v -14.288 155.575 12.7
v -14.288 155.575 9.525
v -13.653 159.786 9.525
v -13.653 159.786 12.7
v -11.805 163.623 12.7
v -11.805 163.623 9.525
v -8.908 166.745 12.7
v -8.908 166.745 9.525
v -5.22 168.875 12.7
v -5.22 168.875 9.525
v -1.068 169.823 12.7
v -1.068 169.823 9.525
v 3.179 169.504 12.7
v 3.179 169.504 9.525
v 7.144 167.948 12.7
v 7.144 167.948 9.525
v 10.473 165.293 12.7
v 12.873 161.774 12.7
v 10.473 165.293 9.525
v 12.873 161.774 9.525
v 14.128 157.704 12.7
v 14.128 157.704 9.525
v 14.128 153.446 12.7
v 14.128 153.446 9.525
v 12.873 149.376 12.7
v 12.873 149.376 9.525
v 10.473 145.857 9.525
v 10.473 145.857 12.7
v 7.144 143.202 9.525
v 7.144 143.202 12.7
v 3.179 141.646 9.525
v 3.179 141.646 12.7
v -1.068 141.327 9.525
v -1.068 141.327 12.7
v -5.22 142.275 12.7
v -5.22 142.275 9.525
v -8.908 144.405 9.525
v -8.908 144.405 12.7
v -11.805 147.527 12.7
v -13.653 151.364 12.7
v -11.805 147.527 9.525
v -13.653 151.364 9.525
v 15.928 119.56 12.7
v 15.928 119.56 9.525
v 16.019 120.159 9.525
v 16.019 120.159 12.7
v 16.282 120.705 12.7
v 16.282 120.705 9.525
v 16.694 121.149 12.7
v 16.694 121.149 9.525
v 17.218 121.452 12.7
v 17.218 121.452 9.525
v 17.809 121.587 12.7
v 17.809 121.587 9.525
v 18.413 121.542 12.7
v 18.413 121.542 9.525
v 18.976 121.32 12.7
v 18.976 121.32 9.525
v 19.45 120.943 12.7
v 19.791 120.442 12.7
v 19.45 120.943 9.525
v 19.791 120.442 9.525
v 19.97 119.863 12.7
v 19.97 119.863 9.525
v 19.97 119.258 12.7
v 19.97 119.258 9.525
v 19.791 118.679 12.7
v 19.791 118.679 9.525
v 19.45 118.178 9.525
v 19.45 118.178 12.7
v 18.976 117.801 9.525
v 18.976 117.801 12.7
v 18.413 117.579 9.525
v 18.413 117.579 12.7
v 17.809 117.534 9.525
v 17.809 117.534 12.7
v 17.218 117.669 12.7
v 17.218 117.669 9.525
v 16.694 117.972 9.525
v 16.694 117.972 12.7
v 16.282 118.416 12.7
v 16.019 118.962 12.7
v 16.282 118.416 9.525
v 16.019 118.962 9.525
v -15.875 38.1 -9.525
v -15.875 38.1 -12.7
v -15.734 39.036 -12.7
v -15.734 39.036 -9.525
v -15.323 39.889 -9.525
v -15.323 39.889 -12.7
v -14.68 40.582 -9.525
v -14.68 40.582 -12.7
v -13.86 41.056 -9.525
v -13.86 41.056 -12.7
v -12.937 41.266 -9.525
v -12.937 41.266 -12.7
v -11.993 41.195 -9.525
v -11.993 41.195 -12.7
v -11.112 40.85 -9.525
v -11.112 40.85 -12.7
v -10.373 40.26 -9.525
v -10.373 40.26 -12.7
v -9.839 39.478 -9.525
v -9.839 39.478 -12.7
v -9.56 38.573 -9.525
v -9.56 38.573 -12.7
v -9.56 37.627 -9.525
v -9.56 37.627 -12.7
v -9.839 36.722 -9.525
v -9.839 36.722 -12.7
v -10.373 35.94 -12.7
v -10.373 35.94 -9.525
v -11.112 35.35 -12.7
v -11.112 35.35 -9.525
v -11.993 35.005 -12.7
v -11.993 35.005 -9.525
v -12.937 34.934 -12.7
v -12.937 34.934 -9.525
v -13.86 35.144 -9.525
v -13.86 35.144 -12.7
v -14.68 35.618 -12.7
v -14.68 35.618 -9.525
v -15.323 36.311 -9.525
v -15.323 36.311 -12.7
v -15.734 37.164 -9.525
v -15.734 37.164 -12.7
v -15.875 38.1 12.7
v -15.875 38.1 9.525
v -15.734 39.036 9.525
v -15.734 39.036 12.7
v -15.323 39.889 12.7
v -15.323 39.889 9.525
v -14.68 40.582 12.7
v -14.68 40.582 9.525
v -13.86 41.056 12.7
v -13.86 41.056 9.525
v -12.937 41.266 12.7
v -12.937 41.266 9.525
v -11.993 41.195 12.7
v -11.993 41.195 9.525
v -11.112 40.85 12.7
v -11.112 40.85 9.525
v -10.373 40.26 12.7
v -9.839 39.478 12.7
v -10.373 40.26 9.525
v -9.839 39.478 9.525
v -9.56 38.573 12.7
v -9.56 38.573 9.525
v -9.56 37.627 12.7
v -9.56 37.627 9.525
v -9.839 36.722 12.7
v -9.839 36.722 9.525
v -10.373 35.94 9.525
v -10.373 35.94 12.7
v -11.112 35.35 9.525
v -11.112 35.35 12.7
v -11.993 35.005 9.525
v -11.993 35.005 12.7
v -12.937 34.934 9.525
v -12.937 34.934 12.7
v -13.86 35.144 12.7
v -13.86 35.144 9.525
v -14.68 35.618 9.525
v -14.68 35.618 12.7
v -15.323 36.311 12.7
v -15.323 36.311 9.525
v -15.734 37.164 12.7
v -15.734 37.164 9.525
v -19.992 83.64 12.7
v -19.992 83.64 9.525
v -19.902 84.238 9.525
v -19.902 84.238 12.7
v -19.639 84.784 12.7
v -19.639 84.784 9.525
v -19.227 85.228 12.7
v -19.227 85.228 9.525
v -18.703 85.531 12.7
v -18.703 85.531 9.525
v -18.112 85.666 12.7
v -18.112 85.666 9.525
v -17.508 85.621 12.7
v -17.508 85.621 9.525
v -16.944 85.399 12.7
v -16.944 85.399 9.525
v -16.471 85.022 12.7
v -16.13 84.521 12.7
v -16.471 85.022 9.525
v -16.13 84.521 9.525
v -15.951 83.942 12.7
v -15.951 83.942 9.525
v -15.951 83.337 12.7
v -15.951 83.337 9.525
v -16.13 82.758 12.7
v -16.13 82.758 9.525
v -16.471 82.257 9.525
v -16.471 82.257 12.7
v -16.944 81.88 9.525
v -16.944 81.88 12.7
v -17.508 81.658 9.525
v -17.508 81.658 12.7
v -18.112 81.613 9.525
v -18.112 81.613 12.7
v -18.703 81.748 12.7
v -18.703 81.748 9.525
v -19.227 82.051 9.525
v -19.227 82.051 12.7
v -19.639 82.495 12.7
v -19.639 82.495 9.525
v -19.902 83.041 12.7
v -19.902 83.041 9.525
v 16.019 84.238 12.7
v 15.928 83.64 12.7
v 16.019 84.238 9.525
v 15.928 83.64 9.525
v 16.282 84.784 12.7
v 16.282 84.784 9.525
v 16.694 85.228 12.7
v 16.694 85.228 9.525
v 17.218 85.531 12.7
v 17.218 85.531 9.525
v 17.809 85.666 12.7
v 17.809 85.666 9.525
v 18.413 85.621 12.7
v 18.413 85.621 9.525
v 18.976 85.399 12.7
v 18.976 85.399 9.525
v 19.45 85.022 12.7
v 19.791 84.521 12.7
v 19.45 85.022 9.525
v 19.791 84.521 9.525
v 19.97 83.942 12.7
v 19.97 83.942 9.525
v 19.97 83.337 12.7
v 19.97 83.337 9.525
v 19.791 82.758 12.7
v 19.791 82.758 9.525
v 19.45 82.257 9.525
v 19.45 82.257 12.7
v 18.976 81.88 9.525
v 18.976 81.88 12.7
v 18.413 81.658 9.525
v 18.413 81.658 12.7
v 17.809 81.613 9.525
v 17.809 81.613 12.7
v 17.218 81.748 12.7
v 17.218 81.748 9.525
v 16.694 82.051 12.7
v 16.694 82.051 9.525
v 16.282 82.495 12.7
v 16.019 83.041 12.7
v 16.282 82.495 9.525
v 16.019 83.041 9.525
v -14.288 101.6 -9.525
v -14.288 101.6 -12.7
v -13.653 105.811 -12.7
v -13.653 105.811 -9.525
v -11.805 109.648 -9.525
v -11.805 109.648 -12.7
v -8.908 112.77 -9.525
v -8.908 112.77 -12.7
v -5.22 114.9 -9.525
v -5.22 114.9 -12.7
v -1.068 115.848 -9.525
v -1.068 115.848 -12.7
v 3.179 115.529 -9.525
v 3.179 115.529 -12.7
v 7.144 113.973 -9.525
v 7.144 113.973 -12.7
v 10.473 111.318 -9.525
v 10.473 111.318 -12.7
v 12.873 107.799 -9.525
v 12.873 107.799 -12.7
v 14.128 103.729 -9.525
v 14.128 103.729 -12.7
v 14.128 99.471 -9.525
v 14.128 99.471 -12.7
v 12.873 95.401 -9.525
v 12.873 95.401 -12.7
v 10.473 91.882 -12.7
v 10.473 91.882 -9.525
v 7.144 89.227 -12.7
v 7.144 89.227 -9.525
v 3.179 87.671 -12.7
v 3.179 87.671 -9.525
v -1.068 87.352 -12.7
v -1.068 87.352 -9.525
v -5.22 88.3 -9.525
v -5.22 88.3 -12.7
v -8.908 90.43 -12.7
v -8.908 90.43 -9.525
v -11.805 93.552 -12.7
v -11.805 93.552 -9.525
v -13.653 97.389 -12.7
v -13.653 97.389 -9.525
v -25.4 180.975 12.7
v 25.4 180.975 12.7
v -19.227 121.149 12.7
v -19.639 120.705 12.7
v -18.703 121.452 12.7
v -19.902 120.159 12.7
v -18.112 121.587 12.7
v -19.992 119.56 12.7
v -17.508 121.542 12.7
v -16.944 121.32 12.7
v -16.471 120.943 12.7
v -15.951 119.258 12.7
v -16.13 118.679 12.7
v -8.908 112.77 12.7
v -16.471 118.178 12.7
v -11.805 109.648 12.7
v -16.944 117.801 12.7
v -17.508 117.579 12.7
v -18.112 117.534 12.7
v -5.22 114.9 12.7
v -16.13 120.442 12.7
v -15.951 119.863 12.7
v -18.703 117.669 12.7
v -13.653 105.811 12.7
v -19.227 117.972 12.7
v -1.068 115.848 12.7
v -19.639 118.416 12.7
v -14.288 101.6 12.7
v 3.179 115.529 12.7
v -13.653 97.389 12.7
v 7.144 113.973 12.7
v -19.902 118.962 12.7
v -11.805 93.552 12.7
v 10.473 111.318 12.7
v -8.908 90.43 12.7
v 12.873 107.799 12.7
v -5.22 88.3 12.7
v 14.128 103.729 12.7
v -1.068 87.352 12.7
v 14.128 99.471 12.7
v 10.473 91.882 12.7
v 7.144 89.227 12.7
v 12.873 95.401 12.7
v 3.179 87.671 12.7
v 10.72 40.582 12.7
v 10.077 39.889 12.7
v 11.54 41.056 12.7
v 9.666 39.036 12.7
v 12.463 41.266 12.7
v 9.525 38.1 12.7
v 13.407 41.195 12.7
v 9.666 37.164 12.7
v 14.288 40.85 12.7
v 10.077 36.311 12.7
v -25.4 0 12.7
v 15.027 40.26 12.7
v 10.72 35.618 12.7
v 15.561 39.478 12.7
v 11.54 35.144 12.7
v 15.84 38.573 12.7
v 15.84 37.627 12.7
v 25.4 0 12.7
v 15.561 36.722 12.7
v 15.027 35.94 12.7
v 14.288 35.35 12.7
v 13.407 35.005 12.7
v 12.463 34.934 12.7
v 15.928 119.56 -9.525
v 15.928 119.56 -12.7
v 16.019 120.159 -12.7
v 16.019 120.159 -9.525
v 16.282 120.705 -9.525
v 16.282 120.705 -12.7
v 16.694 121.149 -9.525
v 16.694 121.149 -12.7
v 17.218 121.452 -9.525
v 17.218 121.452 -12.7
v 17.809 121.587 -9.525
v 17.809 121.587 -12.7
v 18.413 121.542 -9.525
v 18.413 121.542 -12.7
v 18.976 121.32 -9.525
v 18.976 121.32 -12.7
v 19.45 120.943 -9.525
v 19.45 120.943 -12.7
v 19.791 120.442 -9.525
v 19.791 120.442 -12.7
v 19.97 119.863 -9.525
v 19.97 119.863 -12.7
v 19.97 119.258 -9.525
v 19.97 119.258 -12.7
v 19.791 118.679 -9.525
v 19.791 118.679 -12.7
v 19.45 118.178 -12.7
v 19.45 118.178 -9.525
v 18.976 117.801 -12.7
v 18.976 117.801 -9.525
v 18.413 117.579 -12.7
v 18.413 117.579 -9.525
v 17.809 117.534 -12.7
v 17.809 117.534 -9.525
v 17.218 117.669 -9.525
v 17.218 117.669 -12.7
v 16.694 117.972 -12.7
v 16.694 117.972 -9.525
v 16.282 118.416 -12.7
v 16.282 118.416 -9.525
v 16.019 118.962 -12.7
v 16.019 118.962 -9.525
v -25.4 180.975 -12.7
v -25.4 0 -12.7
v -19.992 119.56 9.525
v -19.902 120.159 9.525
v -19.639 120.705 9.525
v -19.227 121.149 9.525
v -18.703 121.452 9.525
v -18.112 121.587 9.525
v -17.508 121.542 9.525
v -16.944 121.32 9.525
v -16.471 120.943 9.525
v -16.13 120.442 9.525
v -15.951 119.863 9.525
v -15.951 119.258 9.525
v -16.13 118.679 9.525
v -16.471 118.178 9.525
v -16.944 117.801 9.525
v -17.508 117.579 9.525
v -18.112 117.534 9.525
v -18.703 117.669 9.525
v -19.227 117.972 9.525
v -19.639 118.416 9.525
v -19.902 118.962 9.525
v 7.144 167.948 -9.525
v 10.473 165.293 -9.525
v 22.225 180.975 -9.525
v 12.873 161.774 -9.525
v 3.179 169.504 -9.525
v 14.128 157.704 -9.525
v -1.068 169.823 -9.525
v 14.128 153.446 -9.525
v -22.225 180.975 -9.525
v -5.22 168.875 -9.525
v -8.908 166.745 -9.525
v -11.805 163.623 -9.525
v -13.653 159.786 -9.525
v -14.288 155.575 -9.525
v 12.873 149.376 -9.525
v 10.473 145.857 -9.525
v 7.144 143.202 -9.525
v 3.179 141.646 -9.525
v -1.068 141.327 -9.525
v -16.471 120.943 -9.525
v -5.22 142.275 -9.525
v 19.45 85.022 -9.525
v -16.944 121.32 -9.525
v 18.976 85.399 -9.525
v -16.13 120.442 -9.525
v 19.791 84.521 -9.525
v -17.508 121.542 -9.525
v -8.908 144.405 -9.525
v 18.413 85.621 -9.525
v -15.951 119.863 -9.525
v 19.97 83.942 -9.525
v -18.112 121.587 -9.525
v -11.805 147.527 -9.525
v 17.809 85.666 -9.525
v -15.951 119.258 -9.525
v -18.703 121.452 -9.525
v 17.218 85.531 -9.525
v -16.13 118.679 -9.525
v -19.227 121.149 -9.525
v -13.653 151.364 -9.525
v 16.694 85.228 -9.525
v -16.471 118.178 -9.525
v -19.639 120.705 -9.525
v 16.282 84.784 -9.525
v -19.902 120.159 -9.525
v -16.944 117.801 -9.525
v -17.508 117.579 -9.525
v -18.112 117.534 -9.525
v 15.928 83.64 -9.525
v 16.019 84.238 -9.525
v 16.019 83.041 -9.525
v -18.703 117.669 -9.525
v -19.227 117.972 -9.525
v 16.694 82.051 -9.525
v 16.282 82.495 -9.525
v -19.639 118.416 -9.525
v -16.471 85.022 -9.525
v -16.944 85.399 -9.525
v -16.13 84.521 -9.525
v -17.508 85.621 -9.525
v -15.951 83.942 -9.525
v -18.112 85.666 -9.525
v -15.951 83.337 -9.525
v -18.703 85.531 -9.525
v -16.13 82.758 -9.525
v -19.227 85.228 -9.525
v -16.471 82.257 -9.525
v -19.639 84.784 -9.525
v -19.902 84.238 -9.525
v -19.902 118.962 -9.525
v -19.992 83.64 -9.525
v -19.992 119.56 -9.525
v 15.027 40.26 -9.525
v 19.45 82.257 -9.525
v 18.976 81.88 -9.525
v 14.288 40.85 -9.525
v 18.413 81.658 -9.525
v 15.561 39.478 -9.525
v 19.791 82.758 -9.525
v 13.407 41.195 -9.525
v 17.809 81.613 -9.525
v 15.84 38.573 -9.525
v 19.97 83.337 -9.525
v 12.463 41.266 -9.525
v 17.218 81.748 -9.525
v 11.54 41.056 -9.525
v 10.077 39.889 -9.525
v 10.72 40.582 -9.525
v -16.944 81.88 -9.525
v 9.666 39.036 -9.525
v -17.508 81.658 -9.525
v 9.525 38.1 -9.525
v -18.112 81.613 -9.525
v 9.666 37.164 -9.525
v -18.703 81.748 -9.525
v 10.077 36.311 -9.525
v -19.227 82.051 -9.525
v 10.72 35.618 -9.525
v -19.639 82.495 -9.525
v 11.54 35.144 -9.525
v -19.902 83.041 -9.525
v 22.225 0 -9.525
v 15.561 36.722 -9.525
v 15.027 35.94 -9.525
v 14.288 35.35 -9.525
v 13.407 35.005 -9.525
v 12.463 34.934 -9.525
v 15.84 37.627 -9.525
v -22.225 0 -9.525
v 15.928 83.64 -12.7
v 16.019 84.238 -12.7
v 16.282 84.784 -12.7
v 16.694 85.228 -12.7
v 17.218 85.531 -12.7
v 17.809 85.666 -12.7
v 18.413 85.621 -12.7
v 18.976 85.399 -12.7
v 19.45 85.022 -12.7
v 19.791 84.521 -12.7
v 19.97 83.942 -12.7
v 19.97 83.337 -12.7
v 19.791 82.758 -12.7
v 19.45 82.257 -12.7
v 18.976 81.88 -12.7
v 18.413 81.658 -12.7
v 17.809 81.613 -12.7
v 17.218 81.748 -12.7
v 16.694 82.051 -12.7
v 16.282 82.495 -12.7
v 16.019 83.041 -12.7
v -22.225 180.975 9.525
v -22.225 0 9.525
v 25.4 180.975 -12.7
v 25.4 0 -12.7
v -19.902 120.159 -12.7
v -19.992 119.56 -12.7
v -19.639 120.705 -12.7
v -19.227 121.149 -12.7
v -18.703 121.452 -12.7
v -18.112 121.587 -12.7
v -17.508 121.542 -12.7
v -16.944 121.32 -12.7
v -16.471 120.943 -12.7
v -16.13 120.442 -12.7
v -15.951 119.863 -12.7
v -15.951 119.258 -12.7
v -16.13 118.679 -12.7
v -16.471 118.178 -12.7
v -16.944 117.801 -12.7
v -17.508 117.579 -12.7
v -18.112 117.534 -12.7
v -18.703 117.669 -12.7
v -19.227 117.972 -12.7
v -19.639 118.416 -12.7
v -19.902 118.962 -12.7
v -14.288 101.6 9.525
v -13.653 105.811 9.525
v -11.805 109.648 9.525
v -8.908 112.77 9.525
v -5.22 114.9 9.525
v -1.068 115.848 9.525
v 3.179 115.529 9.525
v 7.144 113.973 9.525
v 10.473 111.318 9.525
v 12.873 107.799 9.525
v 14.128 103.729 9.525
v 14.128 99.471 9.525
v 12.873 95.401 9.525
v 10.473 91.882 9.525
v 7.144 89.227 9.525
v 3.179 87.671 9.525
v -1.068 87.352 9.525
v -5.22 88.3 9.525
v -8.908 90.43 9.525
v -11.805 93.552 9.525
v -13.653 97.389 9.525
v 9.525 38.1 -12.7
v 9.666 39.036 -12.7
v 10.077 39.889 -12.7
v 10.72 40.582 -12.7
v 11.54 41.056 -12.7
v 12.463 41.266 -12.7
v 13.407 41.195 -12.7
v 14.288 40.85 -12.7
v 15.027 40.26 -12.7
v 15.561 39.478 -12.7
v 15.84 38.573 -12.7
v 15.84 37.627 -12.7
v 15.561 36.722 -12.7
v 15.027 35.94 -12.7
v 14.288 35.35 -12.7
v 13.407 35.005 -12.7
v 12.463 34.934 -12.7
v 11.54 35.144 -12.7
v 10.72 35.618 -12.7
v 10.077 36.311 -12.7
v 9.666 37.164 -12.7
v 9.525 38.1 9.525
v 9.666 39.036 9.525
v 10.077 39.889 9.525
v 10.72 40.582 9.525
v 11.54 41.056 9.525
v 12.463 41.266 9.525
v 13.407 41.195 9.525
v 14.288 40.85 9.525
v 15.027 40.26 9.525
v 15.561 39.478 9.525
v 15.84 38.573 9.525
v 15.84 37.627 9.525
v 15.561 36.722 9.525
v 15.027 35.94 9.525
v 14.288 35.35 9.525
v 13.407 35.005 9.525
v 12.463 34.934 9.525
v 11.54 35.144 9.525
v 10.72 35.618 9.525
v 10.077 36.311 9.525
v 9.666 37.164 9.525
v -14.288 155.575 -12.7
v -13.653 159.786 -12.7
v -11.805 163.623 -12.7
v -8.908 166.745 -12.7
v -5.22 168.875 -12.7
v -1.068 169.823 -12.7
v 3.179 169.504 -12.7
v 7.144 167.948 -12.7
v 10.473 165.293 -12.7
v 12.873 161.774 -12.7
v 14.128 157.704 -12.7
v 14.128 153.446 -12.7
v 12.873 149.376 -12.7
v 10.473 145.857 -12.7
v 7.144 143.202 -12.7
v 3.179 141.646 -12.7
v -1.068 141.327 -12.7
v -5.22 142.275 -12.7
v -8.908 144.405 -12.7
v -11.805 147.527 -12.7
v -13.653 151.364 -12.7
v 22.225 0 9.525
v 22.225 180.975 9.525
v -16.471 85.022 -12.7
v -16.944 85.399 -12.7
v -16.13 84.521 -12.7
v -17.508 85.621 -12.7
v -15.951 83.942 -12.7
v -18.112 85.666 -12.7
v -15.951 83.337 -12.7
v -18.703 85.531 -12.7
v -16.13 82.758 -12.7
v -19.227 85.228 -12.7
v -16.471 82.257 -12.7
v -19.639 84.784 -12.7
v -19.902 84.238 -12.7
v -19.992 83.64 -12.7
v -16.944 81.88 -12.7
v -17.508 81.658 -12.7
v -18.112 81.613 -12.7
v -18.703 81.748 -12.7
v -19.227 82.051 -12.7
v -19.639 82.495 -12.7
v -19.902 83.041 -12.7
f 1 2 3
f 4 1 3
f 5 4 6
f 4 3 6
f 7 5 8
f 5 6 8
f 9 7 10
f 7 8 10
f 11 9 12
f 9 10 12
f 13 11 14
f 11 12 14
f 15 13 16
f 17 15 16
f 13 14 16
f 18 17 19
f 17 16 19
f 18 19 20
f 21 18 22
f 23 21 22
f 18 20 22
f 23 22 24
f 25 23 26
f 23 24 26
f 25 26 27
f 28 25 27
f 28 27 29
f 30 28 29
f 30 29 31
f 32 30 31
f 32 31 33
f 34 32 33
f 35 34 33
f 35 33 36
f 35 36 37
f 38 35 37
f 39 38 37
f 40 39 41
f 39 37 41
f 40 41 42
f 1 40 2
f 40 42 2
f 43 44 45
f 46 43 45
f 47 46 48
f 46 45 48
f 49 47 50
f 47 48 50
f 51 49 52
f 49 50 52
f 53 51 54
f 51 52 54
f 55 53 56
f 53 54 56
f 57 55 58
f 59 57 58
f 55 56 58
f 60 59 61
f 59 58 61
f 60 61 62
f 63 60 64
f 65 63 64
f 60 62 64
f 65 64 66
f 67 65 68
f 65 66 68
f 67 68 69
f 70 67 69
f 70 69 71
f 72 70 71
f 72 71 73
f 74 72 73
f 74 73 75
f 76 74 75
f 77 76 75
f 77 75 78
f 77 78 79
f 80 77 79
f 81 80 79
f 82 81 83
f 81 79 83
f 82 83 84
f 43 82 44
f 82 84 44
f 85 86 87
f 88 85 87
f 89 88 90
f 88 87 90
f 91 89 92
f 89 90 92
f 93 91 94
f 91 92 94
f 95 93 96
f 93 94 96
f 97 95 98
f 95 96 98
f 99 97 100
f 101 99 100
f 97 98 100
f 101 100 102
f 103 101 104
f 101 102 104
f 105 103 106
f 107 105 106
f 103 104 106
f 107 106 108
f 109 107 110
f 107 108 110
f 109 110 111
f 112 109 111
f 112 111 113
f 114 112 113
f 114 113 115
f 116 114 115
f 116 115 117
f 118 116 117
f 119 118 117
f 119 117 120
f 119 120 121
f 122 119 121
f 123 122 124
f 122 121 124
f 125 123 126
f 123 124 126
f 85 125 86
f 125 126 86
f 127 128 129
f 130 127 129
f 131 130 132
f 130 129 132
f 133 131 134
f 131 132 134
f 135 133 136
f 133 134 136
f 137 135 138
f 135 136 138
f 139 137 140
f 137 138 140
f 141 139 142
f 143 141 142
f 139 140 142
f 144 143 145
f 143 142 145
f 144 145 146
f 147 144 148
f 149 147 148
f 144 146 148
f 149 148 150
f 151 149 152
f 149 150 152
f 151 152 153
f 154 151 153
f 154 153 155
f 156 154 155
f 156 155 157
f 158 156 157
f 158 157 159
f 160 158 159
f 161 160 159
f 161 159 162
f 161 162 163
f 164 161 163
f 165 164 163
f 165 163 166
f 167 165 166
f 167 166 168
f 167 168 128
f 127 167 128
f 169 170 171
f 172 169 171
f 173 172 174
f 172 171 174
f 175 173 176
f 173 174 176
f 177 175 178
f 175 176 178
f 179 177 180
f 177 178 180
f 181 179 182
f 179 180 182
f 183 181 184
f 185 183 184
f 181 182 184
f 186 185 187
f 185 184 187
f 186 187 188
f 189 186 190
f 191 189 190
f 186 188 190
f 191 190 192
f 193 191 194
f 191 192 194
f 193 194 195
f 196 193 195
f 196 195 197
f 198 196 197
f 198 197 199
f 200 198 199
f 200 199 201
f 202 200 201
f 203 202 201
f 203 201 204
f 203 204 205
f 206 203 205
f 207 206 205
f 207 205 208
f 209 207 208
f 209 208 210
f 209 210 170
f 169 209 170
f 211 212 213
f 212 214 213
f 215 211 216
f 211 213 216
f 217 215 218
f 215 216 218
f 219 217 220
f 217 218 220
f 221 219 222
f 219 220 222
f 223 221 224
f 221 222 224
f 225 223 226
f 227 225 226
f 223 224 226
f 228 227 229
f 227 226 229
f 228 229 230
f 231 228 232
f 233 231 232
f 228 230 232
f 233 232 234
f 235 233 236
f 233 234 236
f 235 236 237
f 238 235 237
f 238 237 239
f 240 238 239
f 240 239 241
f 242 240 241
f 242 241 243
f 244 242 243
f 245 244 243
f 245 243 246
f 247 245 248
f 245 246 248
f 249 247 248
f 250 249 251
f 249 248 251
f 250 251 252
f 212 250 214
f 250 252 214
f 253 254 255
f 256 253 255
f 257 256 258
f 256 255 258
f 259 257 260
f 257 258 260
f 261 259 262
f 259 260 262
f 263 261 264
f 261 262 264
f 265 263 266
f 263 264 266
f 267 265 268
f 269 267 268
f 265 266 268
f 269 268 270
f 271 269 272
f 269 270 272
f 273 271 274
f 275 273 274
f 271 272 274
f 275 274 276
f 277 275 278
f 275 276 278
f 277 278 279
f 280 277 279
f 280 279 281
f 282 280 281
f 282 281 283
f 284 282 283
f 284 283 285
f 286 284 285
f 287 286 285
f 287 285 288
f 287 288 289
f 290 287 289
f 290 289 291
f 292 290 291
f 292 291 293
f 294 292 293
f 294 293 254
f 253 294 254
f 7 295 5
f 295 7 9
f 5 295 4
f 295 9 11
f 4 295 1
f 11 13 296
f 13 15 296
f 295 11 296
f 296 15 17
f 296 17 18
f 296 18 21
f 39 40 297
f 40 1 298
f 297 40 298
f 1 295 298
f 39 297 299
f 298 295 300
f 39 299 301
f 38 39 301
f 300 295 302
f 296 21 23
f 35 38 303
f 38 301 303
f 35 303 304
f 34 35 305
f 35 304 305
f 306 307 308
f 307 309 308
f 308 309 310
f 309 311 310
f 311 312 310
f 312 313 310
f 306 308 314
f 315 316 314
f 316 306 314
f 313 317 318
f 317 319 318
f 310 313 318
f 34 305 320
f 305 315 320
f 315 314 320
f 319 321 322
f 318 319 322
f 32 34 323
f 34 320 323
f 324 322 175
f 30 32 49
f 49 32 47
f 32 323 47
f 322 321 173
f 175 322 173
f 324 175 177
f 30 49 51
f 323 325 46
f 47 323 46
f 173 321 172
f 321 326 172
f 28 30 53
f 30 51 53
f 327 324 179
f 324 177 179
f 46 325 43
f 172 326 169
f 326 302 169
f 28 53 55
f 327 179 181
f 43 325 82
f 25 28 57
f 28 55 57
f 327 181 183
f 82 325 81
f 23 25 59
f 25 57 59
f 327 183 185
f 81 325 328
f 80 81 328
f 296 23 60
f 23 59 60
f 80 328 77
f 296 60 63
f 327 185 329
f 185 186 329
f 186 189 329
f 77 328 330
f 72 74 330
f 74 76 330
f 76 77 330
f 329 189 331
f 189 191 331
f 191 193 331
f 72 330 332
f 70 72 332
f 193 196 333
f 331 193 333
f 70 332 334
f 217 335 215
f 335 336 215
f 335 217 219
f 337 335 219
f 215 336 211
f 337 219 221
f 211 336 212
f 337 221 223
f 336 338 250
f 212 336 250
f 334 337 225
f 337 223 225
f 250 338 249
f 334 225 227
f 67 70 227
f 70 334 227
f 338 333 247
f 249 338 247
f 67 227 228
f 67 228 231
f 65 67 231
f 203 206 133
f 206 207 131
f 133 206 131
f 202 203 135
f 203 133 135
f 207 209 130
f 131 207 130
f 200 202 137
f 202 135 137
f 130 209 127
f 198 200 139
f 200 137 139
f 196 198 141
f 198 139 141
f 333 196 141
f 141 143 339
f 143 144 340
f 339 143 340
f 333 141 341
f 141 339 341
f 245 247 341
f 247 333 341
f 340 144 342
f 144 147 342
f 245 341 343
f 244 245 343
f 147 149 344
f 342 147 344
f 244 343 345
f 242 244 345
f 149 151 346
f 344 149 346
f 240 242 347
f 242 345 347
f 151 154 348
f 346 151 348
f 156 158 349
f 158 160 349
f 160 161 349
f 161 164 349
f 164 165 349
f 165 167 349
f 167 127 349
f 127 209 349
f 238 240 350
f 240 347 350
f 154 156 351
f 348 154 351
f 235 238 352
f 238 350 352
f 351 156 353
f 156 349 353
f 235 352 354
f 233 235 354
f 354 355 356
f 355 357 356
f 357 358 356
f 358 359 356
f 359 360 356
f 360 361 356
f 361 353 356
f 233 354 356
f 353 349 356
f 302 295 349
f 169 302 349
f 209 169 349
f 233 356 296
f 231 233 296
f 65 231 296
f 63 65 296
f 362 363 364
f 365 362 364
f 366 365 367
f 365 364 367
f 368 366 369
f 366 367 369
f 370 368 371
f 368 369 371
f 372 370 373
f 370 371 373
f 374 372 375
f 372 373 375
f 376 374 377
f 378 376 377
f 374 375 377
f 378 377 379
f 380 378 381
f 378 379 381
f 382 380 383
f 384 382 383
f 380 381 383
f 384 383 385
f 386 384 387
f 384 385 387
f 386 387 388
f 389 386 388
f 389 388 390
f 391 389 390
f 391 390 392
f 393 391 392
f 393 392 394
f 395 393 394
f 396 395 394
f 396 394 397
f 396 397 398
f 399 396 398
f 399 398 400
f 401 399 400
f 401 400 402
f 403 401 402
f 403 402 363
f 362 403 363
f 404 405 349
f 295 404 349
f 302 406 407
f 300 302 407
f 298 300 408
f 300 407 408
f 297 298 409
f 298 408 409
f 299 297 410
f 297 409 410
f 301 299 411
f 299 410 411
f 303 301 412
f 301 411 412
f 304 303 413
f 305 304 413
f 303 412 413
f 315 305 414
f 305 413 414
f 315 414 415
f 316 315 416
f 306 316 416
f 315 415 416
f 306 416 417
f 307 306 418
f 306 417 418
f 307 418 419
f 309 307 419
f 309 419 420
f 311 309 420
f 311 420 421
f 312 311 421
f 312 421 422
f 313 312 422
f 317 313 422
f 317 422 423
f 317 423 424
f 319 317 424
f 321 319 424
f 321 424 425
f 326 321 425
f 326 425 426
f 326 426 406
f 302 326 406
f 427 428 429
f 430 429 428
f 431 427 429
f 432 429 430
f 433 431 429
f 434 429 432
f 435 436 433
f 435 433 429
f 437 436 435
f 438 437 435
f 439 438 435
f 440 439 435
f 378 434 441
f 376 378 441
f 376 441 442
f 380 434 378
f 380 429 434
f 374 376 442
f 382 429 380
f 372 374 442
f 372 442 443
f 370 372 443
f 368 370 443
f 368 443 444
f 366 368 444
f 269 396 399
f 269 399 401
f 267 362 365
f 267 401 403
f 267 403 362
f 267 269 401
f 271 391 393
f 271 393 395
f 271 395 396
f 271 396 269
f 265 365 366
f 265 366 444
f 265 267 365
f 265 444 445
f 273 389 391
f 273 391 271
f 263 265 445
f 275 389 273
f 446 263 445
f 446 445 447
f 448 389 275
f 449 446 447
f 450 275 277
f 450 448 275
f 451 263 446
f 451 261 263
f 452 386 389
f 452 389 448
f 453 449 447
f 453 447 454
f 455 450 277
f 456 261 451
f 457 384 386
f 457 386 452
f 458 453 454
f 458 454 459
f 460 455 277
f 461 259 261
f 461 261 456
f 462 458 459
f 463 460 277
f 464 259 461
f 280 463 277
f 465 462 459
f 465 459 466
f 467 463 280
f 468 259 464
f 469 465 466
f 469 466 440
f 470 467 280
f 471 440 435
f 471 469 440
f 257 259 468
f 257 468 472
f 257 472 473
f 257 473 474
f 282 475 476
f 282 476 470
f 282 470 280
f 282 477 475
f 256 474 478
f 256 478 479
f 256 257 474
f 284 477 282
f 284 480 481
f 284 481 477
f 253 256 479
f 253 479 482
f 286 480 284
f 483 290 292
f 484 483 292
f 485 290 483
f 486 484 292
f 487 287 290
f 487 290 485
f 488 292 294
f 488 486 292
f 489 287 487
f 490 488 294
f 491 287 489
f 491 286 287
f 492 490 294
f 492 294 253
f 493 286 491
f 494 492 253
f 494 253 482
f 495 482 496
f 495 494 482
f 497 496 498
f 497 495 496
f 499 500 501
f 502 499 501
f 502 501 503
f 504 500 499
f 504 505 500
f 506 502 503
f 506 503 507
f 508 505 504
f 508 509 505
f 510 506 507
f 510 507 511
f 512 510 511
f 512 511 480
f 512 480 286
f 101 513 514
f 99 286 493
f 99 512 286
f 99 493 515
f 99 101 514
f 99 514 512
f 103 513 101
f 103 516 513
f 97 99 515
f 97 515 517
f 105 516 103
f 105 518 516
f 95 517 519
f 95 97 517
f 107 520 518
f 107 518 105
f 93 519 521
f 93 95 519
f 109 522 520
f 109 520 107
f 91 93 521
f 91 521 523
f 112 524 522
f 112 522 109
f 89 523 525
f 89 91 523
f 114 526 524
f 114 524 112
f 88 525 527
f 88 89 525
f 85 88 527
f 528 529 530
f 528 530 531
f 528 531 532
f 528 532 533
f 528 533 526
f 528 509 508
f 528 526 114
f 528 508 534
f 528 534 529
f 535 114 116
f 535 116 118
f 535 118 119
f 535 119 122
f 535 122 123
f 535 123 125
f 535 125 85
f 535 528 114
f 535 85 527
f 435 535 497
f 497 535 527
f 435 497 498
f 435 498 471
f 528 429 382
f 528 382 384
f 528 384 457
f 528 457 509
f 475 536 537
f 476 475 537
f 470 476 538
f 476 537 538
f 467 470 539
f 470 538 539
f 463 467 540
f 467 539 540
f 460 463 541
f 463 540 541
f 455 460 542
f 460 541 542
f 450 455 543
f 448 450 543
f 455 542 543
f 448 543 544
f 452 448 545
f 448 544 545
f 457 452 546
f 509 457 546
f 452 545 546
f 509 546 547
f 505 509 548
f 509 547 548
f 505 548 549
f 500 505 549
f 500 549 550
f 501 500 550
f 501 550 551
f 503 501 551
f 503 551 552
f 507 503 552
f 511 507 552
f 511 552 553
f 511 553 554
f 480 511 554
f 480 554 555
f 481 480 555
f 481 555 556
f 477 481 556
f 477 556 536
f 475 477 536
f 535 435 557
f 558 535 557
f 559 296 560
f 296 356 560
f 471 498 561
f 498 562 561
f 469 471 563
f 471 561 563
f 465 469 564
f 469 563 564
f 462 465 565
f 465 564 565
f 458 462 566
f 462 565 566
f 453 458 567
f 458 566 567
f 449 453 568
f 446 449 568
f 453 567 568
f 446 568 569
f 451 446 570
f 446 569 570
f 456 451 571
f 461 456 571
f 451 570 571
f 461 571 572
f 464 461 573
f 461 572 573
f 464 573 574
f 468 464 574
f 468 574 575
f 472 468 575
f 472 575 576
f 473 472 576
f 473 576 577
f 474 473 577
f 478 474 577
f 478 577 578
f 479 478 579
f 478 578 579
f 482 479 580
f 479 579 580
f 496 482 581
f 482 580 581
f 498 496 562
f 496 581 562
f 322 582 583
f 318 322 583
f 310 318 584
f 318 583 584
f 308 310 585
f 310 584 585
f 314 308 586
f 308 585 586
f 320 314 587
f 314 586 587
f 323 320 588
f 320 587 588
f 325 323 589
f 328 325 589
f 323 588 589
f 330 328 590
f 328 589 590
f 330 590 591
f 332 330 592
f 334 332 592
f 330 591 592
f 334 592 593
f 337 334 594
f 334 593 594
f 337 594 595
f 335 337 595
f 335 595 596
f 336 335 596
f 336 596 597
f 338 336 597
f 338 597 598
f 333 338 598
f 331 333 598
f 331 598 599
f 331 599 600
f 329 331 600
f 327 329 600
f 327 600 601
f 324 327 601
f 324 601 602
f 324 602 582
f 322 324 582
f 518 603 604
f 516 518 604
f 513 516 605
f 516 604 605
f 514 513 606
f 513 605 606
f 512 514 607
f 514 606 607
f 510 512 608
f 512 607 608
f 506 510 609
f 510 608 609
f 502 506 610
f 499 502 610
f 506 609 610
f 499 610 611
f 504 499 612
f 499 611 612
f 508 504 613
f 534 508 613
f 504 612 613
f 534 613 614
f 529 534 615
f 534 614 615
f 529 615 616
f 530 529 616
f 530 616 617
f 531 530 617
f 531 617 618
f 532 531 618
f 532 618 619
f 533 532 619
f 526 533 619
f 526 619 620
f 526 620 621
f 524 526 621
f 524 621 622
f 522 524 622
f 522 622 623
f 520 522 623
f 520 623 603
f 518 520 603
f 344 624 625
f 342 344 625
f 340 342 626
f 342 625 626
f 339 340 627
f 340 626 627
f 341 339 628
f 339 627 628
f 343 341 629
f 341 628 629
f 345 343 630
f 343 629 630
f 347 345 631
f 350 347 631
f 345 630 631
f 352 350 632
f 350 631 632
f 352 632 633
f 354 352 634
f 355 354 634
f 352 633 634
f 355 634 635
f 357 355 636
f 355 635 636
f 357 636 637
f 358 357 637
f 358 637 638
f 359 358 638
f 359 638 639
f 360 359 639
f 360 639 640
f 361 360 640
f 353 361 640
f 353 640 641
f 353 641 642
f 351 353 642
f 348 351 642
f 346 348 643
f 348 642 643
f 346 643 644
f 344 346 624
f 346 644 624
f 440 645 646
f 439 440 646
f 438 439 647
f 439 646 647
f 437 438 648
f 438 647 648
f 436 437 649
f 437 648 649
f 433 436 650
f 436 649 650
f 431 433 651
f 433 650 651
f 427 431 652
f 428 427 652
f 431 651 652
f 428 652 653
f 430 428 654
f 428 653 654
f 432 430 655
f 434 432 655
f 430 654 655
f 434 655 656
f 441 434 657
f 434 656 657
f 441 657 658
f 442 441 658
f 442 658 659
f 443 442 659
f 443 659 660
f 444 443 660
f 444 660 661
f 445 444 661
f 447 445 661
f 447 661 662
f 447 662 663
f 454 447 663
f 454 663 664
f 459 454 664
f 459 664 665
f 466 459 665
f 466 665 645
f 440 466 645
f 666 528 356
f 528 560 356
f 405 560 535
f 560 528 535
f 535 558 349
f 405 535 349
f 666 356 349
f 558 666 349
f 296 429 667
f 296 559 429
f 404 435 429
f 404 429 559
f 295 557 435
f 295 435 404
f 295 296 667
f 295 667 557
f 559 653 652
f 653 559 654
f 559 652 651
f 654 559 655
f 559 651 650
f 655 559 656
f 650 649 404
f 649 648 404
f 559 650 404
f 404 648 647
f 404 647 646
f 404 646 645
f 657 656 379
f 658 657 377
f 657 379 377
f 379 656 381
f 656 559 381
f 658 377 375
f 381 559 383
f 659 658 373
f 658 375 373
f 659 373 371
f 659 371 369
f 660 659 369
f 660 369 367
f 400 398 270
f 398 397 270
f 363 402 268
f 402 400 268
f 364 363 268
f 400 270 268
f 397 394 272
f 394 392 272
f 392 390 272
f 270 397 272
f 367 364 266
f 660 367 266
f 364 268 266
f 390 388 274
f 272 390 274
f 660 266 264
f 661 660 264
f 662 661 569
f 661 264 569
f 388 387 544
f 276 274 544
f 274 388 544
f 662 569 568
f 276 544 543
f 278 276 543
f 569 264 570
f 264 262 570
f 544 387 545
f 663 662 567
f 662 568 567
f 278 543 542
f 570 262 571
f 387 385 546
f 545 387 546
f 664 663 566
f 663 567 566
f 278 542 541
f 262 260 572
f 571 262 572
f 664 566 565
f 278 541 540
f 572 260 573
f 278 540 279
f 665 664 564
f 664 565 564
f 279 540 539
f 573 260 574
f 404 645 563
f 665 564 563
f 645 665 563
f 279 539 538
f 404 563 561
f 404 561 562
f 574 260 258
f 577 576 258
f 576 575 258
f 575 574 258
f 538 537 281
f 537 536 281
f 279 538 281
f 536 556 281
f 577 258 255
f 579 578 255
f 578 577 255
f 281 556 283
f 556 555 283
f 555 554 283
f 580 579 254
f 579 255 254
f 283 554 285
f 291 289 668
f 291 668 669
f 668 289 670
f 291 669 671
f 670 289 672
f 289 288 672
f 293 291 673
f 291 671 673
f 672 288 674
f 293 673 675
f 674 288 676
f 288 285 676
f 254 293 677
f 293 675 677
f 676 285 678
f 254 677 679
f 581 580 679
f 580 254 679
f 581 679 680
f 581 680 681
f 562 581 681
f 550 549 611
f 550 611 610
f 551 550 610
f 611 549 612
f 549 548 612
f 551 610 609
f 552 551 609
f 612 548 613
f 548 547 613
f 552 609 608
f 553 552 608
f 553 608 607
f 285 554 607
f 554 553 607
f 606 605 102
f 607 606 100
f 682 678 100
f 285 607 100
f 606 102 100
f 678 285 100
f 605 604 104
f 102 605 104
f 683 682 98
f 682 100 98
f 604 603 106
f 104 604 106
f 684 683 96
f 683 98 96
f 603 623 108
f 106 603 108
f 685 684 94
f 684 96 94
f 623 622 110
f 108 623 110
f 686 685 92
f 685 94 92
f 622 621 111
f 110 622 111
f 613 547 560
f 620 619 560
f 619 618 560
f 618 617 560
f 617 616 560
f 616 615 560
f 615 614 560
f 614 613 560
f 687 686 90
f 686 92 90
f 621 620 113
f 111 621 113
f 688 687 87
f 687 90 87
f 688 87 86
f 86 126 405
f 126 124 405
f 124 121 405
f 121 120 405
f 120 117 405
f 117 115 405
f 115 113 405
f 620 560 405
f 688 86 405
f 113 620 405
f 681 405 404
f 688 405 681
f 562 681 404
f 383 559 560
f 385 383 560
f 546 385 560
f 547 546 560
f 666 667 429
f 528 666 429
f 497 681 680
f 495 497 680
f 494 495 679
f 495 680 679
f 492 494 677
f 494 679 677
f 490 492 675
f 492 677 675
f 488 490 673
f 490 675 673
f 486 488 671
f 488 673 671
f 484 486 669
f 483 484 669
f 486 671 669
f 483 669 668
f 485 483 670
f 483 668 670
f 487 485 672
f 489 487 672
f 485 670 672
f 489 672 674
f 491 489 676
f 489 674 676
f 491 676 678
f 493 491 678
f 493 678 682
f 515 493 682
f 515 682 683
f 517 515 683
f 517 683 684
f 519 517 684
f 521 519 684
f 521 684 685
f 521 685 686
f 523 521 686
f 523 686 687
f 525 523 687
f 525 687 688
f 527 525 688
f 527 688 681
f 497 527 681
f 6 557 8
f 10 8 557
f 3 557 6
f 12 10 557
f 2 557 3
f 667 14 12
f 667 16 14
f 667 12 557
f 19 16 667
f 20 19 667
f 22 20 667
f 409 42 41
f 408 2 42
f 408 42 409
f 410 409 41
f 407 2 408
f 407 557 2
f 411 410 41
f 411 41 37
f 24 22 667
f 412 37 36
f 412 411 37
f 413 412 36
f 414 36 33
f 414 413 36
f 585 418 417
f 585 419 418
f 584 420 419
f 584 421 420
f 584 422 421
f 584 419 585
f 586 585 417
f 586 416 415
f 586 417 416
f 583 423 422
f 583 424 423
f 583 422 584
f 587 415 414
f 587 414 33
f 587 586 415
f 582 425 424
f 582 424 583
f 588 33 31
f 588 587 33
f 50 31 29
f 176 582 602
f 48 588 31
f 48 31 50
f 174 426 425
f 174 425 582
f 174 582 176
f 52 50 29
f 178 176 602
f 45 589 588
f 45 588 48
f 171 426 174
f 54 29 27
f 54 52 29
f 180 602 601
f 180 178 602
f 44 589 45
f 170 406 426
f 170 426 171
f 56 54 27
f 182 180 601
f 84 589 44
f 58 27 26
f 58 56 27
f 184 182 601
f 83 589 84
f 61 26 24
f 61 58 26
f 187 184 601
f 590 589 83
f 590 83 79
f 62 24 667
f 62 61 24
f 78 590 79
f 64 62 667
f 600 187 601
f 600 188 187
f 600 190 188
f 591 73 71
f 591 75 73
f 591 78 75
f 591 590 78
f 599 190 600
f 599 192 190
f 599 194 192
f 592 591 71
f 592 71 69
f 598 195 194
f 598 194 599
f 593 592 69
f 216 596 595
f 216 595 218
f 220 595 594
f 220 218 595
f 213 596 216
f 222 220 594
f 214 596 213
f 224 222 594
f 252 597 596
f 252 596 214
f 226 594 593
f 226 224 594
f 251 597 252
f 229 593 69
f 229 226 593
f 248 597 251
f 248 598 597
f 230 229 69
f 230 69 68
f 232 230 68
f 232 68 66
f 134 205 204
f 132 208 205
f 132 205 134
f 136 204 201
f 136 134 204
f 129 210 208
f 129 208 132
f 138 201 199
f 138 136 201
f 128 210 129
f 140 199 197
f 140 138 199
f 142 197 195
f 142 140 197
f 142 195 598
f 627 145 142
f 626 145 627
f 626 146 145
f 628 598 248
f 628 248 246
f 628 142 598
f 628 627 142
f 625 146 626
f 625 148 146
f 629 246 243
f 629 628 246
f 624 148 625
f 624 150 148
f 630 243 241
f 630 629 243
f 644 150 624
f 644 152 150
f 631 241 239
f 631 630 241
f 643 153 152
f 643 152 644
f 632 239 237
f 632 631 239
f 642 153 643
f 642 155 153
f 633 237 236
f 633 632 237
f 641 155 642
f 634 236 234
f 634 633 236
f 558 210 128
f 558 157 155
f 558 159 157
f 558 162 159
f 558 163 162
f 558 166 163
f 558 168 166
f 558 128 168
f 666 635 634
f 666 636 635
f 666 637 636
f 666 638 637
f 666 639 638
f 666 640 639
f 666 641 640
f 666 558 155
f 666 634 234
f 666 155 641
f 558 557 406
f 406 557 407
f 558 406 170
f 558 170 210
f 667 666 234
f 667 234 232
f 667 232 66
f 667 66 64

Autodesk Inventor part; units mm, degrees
ref_plane "YZ Plane" through (0, 0, 0) normal (1, 0, 0) x (0, 1, 0)
ref_plane "XZ Plane" through (0, 0, 0) normal (0, 1, 0) x (-1, 0, 0)
ref_plane "XY Plane" through (0, 0, 0) normal (0, 0, 1) x (1, 0, 0)
sketch "Sketch1" plane through (0, 0, 0) normal (0, 1, 0) x (-1, 0, 0)
  line L0 (25.4, 12.7) -> (-25.4, 12.7)
  line L1 (-25.4, 12.7) -> (-25.4, -12.7)
  line L2 (-25.4, -12.7) -> (25.4, -12.7)
  line L3 (25.4, -12.7) -> (25.4, 12.7)
  line L4 (25.4, 12.7) -> (-25.4, -12.7) construction
  line L5 (-25.4, 12.7) -> (25.4, -12.7) construction
  line L6 (22.225, 9.525) -> (-22.225, 9.525)
  line L7 (-22.225, 9.525) -> (-22.225, -9.525)
  line L8 (-22.225, -9.525) -> (22.225, -9.525)
  line L9 (22.225, -9.525) -> (22.225, 9.525)
  line L10 (22.225, 9.525) -> (-22.225, -9.525) construction
  line L11 (-22.225, 9.525) -> (22.225, -9.525) construction
  point P0 (0, 0)
  dimension "d0" = 50.8
  dimension "d1" = 25.4
  dimension "d2" = 44.45
  dimension "d3" = 19.05
extrude "Extrusion1" add sketch "Sketch1" along normal blind 180.975
sketch "Sketch2" plane through (25.4, 0, -12.7) normal (0, 0, -1) x (-1, 0, 0)
  line L0 (50.8, 0) -> (50.8, 180.975) projected
  line L1 (0, 180.975) -> (50.8, 180.975) projected
  line L2 (0, 0) -> (0, 180.975) projected
  line L3 (25.4, 0) -> (63.5, 0) construction
  line L4 (25.4, 38.1) -> (50.8, 38.1)
  line L5 (50.8, 38.1) -> (0, 38.1)
  line L6 (0, 38.1) -> (12.7, 38.1)
  line L7 (0, 38.1) -> (12.7, 38.1) construction
  line L8 (12.7, 38.1) -> (38.1, 38.1)
  circle A0 centre (12.7, 38.1) radius 3.175
  circle A1 centre (38.1, 38.1) radius 3.175
  line L9 (25.4, 180.975) -> (25.4, 155.575)
  line L10 (25.4, 180.975) -> (50.8, 180.975) construction
  circle A2 centre (25.4, 155.575) radius 14.2875
  dimension "d6" = 38.1
  dimension "d8" = 12.7
  dimension "d9" = 0
  dimension "d10" = 25.4
  dimension "d11" = 180
  dimension "d12" = 6.35
  dimension "d13" = 6.35
  dimension "d14" = 25.4
  dimension "d15" = 90
  dimension "d16" = 28.575
extrude "Extrusion2" cut sketch "Sketch2" against normal blind 180.975 contours A2 | A1 L4 | L4 A1 | A0 L5 | L5 A0
sketch "Sketch3" plane through (25.4, 0, -12.7) normal (0, 0, -1) x (-1, 0, 0)
  line L0 (0, 0) -> (0, 180.975) projected
  line L1 (25.4, 0) -> (25.4, 101.6)
  line L2 (25.4, 0) -> (127, 0) construction
  circle A0 centre (25.4, 101.6) radius 14.2875
  line L3 (25.4, 101.6) -> (43.3605, 119.5605)
  line L4 (25.4, 101.6) -> (50.8, 101.6) construction
  line L5 (43.3605, 119.5605) -> (7.4395, 83.6395)
  line L6 (7.4395, 83.6395) -> (43.3605, 83.6395)
  line L7 (43.3605, 83.6395) -> (43.3605, 119.5605)
  line L8 (43.3605, 119.5605) -> (7.4395, 119.5605)
  line L9 (7.4395, 119.5605) -> (7.4395, 83.6395)
  circle A1 centre (7.4395, 119.5605) radius 2.032
  circle A2 centre (43.3605, 119.5605) radius 2.032
  circle A3 centre (43.3605, 83.6395) radius 2.032
  circle A4 centre (7.4395, 83.6395) radius 2.032
  dimension "d19" = 101.6
  dimension "d20" = 90
  dimension "d21" = 28.575
  dimension "d22" = 25.4
  dimension "d23" = 45
  dimension "d24" = 50.8
  dimension "d25" = 0
  dimension "d26" = 4.064
  dimension "d27" = 4.064
  dimension "d28" = 4.064
  dimension "d29" = 4.064
extrude "Extrusion3" cut sketch "Sketch3" against normal blind 180.975 contours A0 L5 L1 | L1 L3 A0 | A4 L9 L6 | L6 L5 A4 | A3 L7 L6 | L6 L7 A3 | L5 A0 L3 | L9 A4 L5 | A1 L8 L9 | L9 L8 A1 | A2 L3 L7 | L7 L8 A2 | A2 L8 L3
properties part number "Z-ArmStructure"
